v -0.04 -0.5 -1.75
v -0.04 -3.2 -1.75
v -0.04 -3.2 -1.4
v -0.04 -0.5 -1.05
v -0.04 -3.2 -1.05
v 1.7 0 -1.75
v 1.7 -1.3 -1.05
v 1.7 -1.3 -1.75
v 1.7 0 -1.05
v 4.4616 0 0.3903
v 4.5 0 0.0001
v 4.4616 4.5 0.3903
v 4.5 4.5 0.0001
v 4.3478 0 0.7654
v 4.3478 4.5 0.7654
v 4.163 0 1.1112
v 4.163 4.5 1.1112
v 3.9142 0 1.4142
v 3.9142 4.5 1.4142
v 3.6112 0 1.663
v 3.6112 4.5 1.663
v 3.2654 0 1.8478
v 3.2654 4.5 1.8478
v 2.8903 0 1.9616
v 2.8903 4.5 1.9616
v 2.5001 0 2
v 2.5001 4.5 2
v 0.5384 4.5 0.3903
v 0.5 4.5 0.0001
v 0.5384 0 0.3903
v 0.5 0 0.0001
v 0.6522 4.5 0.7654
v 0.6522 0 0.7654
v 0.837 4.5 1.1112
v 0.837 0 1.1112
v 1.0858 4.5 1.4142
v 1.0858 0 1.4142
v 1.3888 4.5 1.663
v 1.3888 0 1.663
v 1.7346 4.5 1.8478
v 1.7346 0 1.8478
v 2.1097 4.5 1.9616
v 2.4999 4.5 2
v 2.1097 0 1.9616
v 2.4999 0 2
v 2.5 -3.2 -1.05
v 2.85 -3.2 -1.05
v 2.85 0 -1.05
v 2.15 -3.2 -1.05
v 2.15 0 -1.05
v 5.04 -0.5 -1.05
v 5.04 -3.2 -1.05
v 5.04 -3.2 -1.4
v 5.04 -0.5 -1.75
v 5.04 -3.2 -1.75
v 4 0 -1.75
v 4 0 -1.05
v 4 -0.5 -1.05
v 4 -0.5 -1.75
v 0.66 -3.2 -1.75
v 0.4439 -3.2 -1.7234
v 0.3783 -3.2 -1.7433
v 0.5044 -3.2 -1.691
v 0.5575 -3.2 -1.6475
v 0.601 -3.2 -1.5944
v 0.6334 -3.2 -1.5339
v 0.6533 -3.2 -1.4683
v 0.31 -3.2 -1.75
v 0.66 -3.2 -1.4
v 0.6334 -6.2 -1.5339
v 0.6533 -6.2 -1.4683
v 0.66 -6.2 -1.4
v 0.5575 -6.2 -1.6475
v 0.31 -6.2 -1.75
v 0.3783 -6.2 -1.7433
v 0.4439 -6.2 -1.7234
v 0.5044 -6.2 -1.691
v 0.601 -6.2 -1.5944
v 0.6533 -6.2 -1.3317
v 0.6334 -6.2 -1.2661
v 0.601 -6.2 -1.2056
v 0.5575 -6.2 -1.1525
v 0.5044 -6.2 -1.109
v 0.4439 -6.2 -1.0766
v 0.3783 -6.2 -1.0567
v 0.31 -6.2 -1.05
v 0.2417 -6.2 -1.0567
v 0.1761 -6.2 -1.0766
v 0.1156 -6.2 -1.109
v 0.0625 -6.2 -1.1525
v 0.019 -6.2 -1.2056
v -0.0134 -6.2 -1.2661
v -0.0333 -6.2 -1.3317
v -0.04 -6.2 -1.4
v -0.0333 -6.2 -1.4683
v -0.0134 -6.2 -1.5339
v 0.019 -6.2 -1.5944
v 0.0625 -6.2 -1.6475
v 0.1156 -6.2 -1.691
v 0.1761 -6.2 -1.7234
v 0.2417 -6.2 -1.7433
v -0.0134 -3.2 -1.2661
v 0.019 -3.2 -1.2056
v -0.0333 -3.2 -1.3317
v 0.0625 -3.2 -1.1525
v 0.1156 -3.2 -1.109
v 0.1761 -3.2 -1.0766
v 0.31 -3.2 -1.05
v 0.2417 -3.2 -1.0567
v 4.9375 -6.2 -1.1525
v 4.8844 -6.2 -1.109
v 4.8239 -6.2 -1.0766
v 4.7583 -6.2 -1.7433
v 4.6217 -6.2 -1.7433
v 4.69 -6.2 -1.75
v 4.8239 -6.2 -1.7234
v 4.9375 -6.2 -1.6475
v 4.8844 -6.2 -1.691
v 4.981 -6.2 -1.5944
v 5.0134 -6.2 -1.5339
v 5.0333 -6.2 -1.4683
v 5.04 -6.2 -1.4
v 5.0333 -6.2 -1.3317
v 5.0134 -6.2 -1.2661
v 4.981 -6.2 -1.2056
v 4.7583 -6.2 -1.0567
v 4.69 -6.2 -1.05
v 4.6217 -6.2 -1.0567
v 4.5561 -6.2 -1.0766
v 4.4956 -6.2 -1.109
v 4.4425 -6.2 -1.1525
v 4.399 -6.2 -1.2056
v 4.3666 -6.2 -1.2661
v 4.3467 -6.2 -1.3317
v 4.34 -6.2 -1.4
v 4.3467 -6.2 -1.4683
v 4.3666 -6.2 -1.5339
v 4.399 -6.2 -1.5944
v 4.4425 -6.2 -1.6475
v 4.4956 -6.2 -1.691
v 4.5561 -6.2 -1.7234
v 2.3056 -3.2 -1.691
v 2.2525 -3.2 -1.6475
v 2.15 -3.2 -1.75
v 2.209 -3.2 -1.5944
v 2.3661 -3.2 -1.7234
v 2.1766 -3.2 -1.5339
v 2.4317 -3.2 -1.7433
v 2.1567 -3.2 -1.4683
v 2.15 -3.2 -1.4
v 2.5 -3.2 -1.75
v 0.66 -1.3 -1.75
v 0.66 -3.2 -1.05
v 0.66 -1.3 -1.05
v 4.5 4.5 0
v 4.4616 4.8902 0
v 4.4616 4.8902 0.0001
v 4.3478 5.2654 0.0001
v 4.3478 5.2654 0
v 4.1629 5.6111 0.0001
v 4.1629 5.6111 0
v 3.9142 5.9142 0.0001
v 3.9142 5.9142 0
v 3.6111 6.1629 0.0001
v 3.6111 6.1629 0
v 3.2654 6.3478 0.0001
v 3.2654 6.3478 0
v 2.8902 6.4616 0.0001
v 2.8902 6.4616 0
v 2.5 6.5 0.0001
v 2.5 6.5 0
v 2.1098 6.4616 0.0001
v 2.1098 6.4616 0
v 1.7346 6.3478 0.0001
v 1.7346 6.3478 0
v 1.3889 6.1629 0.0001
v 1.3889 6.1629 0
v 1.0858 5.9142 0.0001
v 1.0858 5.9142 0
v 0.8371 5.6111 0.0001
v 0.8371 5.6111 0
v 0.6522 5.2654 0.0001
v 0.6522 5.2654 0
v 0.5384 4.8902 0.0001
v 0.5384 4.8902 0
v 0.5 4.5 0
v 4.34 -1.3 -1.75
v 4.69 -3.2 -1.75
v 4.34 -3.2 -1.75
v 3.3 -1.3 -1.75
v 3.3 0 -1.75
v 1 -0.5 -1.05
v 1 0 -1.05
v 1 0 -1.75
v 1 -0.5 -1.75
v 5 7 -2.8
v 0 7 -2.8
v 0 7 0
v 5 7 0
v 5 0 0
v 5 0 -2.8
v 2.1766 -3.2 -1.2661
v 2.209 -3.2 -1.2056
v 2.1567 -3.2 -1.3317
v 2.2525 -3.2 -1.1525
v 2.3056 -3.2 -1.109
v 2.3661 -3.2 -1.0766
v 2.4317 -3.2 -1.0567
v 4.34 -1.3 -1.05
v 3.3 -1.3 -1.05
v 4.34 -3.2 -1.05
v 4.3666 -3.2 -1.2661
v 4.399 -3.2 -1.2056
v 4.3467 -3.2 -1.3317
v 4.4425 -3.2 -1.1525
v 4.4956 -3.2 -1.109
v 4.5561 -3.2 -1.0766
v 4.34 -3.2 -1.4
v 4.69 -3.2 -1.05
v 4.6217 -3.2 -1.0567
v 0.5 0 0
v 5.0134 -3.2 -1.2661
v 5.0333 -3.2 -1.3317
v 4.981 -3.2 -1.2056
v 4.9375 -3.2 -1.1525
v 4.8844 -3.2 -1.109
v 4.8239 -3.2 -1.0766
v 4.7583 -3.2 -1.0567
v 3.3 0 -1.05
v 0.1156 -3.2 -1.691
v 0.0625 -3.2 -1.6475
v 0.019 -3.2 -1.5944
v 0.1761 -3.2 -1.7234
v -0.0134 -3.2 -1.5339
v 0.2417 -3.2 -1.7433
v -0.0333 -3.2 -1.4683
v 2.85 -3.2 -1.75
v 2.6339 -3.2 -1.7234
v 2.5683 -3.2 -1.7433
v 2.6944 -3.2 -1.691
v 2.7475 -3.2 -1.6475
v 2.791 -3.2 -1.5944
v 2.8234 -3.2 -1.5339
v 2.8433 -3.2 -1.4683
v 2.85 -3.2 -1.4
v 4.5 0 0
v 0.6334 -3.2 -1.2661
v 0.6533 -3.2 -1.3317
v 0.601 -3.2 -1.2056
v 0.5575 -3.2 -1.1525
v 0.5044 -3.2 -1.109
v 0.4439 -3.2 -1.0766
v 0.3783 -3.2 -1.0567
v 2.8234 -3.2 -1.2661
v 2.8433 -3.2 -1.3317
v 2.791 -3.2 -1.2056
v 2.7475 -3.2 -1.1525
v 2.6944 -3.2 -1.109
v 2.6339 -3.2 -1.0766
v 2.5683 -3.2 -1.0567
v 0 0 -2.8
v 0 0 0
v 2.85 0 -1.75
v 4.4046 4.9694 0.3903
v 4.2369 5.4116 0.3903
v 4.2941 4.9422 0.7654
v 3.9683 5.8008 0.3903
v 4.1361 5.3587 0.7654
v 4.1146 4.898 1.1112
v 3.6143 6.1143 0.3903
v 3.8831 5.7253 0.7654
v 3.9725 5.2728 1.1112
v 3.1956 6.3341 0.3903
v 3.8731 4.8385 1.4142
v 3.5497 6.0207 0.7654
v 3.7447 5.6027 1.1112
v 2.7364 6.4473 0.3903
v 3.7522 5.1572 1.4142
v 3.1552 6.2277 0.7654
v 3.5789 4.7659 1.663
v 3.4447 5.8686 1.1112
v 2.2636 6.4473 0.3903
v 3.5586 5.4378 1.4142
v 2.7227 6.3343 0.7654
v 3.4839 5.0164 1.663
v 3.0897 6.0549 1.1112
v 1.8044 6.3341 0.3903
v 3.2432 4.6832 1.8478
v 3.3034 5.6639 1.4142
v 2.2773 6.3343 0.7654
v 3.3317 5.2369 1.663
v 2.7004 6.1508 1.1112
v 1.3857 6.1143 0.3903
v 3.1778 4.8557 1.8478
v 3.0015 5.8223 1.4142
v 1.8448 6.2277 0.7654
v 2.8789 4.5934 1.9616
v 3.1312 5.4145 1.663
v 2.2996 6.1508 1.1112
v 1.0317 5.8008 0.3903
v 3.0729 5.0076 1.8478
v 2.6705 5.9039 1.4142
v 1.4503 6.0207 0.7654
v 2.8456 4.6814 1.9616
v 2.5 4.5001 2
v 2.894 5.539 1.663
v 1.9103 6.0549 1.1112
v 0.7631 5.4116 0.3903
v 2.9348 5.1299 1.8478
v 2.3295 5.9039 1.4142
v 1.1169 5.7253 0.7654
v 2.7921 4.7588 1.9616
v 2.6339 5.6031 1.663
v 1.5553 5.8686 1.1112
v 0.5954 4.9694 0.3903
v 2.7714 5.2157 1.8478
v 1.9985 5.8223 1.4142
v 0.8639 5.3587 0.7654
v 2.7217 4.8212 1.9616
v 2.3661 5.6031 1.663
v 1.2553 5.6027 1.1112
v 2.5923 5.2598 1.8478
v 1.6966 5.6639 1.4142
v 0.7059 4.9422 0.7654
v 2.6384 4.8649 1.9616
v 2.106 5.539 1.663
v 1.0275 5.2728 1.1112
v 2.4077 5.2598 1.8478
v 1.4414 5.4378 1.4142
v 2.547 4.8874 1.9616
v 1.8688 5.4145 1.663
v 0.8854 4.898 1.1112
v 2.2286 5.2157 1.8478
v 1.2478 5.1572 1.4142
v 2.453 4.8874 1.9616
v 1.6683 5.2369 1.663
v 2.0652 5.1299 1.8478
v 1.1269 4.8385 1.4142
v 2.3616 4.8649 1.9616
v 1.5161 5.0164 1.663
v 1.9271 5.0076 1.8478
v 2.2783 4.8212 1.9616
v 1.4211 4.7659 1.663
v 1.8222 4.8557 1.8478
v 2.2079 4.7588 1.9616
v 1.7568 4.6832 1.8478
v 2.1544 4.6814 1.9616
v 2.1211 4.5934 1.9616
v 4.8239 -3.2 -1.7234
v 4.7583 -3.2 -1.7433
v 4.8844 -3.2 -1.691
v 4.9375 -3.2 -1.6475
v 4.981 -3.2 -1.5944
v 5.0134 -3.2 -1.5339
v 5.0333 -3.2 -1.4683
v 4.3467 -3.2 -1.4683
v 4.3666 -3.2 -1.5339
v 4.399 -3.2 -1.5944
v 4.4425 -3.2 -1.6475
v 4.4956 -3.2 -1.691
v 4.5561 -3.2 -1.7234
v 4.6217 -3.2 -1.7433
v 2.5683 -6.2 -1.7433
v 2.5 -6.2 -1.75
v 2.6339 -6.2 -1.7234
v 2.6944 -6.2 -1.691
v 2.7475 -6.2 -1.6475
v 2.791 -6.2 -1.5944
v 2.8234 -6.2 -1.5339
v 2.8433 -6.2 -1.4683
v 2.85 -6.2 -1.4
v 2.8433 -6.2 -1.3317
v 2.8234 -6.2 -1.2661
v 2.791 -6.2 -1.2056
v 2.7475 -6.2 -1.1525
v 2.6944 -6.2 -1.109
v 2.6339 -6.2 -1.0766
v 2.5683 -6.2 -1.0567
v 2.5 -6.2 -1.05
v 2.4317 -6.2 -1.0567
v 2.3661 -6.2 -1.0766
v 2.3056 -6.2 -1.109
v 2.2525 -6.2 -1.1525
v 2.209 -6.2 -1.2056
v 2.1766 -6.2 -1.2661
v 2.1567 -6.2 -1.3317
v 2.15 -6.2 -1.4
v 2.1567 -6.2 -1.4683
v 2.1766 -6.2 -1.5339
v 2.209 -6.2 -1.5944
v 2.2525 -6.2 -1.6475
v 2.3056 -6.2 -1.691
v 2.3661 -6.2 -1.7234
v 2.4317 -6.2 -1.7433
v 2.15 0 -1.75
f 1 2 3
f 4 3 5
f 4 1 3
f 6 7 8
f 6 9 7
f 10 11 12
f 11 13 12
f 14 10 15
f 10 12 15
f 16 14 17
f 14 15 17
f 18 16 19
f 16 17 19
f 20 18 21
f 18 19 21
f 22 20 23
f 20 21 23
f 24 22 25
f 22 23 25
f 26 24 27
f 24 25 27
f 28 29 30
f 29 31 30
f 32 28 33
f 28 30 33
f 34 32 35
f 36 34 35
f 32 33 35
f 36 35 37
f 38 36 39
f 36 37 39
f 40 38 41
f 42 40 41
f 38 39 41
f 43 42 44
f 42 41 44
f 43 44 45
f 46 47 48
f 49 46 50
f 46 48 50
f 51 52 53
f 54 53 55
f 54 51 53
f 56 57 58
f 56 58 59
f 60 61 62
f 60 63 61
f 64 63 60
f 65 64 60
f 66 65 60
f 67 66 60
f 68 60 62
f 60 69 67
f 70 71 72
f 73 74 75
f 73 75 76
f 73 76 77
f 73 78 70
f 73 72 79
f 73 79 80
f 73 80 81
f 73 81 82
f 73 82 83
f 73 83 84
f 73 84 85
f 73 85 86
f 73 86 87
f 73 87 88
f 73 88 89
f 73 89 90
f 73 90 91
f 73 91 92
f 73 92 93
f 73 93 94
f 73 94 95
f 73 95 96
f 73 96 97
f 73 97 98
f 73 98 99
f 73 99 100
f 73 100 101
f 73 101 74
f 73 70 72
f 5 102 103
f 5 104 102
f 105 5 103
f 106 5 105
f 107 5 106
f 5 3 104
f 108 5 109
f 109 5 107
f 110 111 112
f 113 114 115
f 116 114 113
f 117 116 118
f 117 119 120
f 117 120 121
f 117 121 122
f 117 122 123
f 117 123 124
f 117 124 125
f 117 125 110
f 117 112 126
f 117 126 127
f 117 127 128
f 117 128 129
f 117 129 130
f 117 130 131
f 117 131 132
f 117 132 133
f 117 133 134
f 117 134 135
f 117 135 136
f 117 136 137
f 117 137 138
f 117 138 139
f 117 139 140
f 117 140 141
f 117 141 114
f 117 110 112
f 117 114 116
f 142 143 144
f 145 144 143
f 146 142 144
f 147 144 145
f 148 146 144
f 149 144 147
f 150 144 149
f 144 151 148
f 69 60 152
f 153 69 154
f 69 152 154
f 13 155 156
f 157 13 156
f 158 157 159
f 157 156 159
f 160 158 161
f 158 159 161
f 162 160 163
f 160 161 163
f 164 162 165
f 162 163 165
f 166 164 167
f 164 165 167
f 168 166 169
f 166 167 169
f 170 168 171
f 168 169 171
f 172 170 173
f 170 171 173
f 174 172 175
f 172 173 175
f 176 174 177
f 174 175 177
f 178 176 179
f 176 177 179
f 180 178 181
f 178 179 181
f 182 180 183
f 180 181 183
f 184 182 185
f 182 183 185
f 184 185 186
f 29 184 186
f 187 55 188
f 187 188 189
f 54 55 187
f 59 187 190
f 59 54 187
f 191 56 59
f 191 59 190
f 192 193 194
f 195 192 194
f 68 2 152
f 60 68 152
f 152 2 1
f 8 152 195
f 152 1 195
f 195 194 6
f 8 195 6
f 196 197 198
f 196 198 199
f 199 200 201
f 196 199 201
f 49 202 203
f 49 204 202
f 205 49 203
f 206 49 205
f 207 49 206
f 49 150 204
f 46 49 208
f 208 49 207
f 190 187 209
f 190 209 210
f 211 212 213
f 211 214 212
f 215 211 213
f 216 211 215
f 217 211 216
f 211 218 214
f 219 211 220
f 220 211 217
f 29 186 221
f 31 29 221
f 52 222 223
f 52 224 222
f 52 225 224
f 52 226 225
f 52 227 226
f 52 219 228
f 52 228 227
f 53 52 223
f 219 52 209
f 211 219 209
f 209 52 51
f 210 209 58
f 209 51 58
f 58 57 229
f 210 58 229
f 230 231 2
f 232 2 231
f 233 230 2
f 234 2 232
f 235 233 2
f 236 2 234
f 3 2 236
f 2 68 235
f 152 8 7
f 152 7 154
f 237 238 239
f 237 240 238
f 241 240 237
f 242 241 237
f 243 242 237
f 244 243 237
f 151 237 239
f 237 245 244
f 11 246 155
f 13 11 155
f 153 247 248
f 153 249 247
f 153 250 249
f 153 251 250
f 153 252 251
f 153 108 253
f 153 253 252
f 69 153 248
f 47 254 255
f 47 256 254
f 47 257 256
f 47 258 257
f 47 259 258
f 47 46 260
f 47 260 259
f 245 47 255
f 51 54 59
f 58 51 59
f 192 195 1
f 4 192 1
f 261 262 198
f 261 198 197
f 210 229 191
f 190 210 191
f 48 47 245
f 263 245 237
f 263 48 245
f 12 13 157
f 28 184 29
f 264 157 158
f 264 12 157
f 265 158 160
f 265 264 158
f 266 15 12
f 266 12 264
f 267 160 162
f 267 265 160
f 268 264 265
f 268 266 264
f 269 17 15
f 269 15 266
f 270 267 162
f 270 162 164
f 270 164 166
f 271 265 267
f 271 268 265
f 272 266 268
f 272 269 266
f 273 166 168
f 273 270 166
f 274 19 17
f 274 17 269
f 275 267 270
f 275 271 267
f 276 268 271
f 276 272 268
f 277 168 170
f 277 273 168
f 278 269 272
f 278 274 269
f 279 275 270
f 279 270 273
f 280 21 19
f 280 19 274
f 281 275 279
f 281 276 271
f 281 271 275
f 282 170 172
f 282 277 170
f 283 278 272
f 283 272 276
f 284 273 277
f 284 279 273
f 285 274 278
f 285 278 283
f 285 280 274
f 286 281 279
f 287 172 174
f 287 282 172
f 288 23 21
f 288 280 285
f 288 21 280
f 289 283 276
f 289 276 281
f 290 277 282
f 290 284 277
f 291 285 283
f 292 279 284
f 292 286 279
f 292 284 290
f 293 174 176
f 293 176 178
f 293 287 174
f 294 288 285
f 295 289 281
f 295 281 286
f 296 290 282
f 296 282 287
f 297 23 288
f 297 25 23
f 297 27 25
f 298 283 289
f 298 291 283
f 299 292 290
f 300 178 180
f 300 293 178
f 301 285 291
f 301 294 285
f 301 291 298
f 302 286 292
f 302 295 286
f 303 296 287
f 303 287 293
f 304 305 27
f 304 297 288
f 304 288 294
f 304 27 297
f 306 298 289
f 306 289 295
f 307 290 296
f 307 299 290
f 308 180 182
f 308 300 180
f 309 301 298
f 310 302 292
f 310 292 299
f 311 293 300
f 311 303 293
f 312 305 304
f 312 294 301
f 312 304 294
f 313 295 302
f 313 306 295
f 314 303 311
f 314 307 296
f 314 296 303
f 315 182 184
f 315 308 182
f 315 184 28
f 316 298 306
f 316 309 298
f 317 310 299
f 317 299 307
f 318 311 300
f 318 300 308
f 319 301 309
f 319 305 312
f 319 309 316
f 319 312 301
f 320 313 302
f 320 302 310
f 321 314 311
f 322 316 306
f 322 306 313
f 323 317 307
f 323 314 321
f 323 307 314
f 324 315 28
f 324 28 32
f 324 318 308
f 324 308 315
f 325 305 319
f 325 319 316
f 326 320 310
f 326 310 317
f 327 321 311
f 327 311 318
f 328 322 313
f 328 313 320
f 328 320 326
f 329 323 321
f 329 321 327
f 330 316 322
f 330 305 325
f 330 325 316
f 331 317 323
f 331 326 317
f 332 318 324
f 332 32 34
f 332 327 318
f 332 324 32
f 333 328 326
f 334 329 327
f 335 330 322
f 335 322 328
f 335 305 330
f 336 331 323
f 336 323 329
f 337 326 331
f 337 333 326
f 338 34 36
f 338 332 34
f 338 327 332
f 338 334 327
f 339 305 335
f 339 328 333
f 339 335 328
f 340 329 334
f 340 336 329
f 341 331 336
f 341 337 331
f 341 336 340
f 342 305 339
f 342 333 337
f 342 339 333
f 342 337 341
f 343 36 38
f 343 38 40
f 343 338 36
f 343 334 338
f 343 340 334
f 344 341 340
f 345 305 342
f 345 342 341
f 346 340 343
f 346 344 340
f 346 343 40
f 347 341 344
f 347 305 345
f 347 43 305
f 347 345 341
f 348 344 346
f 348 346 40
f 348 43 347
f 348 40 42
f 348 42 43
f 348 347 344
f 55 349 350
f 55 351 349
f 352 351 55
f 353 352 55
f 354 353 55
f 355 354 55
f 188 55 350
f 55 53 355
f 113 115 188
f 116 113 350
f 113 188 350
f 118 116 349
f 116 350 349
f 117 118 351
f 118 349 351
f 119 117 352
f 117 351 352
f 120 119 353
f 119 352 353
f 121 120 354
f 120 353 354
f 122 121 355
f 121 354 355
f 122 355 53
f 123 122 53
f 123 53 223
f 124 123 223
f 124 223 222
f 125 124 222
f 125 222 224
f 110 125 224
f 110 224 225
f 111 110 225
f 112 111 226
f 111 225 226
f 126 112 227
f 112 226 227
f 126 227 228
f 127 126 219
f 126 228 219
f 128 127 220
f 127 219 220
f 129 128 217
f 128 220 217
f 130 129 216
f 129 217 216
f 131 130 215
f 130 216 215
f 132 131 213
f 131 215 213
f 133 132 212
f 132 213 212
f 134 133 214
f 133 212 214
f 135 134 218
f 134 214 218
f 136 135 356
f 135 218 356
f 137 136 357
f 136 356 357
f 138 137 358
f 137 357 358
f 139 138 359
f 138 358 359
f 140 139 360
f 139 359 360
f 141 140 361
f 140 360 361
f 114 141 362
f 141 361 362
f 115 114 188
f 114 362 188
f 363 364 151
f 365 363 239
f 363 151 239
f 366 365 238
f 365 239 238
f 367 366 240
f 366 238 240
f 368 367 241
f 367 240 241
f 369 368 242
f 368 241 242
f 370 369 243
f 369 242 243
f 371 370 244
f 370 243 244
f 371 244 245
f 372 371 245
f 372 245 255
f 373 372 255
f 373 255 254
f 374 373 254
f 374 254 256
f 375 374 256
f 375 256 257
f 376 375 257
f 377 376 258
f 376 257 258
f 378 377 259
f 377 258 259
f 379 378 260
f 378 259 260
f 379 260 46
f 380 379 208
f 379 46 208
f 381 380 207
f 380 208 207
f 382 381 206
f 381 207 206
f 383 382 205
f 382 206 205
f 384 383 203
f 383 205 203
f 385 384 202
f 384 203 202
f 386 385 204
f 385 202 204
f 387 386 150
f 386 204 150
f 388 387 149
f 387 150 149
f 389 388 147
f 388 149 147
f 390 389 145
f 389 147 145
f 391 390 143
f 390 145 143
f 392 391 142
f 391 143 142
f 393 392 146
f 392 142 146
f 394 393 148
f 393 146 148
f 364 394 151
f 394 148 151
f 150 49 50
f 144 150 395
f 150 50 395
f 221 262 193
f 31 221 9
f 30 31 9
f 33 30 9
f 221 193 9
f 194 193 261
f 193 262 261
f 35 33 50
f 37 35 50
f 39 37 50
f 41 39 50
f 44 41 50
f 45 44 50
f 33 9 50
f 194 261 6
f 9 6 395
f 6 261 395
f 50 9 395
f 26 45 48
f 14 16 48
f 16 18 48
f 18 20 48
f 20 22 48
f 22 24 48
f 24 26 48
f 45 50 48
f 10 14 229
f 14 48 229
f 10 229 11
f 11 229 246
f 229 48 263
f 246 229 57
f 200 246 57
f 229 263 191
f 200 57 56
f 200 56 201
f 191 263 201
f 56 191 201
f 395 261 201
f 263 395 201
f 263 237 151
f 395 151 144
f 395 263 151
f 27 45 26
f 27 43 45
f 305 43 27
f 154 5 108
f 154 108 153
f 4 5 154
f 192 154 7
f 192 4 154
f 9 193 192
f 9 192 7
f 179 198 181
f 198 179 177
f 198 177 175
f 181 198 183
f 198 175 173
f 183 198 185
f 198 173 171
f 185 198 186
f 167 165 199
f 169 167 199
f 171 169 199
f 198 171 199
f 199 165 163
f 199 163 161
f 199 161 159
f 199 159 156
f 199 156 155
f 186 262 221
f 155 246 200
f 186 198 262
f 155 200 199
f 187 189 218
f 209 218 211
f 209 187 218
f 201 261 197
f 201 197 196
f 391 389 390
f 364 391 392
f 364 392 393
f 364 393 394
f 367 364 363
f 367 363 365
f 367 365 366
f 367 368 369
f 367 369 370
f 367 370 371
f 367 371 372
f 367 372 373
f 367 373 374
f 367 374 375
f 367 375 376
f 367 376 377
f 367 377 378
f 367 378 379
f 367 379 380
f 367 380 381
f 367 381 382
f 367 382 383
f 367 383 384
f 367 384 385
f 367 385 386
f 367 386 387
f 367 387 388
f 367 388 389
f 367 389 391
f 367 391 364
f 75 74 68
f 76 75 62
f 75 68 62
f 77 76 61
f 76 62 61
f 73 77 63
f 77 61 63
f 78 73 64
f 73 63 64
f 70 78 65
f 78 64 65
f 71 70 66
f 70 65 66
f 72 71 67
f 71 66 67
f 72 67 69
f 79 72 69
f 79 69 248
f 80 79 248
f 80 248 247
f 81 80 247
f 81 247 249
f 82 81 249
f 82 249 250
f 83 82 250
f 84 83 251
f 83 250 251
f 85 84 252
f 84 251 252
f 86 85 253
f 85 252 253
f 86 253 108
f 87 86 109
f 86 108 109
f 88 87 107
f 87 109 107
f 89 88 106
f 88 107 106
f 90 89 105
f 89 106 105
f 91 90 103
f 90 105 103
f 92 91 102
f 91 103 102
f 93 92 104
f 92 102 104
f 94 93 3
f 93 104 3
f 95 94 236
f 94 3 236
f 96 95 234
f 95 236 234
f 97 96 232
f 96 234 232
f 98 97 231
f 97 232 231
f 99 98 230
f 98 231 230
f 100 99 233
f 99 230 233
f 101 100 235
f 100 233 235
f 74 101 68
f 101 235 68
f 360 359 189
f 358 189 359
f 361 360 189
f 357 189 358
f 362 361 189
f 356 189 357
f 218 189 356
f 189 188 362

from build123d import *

# Parameters (mm, degrees)
SCHIZZO1_W                   = 5
SCHIZZO1_H                   = 2.8
ESTRUSIONE_ESTRUSIONE1_DEPTH = 7
ESTRUSIONE_ESTRUSIONE2_DEPTH = 2
RACCORDO1_R                  = 2
SCHIZZO3_W                   = 0.7
SCHIZZO3_H                   = 0.7
ESTRUSIONE_ESTRUSIONE3_DEPTH = 0.5
SCHIZZO4_W                   = 1.74
SCHIZZO4_H                   = 0.7
SCHIZZO4_W_2                 = 0.7
ESTRUSIONE_ESTRUSIONE4_DEPTH = 0.8
SCHIZZO5_W                   = 0.7
SCHIZZO5_H                   = 0.7
ESTRUSIONE_ESTRUSIONE5_DEPTH = 1.9
SCHIZZO6_R                   = 0.35
ESTRUSIONE_ESTRUSIONE6_DEPTH = 3


with BuildPart() as part:
    # Schizzo1 → Estrusione-Estrusione1 (new body)
    with BuildSketch(Plane(origin=(0, 0, 0), x_dir=(1, 0, 0), z_dir=(0, 1, 0))):
        with Locations((2.5, 1.4)):
            Rectangle(SCHIZZO1_W, SCHIZZO1_H)
    extrude(amount=ESTRUSIONE_ESTRUSIONE1_DEPTH)

    # Schizzo2 → Estrusione-Estrusione2 (add)
    with BuildSketch(Plane.XY):
        with BuildLine():
            Line((0.5, 0), (4.5, 0))
            Line((4.5, 0), (4.5, 4.5))
            ThreePointArc((4.5, 4.5), (2.5, 6.5), (0.5, 4.5))
            Line((0.5, 4.5), (0.5, 0))
        make_face()
    extrude(amount=ESTRUSIONE_ESTRUSIONE2_DEPTH)

    # Raccordo1
    raccordo1_edges = [part.edges().sort_by_distance(p)[0] for p in [
        (4.5, 2.25, 2),
        (0.5, 2.25, 2),
        (2.5, 6.5, 2),
    ]]
    fillet(raccordo1_edges, radius=RACCORDO1_R - 0.0001)  # a hair under: the kernel refuses the full size

    # Schizzo3 → Estrusione-Estrusione3 (add)
    with BuildSketch(Plane(origin=(0, 0, 0), x_dir=(-1, 0, 0), z_dir=(0, -1, 0))):
        with Locations((-1.35, 1.4)):
            Rectangle(SCHIZZO3_W, SCHIZZO3_H)
        with Locations((-2.5, 1.4)):
            Rectangle(SCHIZZO3_W, SCHIZZO3_H)
        with Locations((-3.65, 1.4)):
            Rectangle(SCHIZZO3_W, SCHIZZO3_H)
    extrude(amount=ESTRUSIONE_ESTRUSIONE3_DEPTH)

    # Schizzo4 → Estrusione-Estrusione4 (add)
    with BuildSketch(Plane(origin=(0, -0.5, 0), x_dir=(-1, 0, 0), z_dir=(0, -1, 0))):
        with Locations((-0.83, 1.4)):
            Rectangle(SCHIZZO4_W, SCHIZZO4_H)
        with Locations((-2.5, 1.4)):
            Rectangle(SCHIZZO4_W_2, SCHIZZO4_H)
        with Locations((-4.17, 1.4)):
            Rectangle(SCHIZZO4_W, SCHIZZO4_H)
    extrude(amount=ESTRUSIONE_ESTRUSIONE4_DEPTH)

    # Schizzo5 → Estrusione-Estrusione5 (add)
    with BuildSketch(Plane.XZ.offset(1.3)):
        with Locations((0.31, -1.4)):
            Rectangle(SCHIZZO5_W, SCHIZZO5_H)
        with Locations((4.69, -1.4)):
            Rectangle(SCHIZZO5_W, SCHIZZO5_H)
        with Locations((2.5, -1.4)):
            Rectangle(SCHIZZO5_W, SCHIZZO5_H)
    extrude(amount=ESTRUSIONE_ESTRUSIONE5_DEPTH)

    # Schizzo6 → Estrusione-Estrusione6 (add)
    with BuildSketch(Plane.XZ.offset(3.2)):
        with Locations(Location((0.31, -1.4, 0), (0, 0, 270))):
            Circle(SCHIZZO6_R)
        with Locations(Location((2.5, -1.4, 0), (0, 0, 270))):
            Circle(SCHIZZO6_R)
        with Locations(Location((4.69, -1.4, 0), (0, 0, 270))):
            Circle(SCHIZZO6_R)
    extrude(amount=ESTRUSIONE_ESTRUSIONE6_DEPTH)


solid = part.part
